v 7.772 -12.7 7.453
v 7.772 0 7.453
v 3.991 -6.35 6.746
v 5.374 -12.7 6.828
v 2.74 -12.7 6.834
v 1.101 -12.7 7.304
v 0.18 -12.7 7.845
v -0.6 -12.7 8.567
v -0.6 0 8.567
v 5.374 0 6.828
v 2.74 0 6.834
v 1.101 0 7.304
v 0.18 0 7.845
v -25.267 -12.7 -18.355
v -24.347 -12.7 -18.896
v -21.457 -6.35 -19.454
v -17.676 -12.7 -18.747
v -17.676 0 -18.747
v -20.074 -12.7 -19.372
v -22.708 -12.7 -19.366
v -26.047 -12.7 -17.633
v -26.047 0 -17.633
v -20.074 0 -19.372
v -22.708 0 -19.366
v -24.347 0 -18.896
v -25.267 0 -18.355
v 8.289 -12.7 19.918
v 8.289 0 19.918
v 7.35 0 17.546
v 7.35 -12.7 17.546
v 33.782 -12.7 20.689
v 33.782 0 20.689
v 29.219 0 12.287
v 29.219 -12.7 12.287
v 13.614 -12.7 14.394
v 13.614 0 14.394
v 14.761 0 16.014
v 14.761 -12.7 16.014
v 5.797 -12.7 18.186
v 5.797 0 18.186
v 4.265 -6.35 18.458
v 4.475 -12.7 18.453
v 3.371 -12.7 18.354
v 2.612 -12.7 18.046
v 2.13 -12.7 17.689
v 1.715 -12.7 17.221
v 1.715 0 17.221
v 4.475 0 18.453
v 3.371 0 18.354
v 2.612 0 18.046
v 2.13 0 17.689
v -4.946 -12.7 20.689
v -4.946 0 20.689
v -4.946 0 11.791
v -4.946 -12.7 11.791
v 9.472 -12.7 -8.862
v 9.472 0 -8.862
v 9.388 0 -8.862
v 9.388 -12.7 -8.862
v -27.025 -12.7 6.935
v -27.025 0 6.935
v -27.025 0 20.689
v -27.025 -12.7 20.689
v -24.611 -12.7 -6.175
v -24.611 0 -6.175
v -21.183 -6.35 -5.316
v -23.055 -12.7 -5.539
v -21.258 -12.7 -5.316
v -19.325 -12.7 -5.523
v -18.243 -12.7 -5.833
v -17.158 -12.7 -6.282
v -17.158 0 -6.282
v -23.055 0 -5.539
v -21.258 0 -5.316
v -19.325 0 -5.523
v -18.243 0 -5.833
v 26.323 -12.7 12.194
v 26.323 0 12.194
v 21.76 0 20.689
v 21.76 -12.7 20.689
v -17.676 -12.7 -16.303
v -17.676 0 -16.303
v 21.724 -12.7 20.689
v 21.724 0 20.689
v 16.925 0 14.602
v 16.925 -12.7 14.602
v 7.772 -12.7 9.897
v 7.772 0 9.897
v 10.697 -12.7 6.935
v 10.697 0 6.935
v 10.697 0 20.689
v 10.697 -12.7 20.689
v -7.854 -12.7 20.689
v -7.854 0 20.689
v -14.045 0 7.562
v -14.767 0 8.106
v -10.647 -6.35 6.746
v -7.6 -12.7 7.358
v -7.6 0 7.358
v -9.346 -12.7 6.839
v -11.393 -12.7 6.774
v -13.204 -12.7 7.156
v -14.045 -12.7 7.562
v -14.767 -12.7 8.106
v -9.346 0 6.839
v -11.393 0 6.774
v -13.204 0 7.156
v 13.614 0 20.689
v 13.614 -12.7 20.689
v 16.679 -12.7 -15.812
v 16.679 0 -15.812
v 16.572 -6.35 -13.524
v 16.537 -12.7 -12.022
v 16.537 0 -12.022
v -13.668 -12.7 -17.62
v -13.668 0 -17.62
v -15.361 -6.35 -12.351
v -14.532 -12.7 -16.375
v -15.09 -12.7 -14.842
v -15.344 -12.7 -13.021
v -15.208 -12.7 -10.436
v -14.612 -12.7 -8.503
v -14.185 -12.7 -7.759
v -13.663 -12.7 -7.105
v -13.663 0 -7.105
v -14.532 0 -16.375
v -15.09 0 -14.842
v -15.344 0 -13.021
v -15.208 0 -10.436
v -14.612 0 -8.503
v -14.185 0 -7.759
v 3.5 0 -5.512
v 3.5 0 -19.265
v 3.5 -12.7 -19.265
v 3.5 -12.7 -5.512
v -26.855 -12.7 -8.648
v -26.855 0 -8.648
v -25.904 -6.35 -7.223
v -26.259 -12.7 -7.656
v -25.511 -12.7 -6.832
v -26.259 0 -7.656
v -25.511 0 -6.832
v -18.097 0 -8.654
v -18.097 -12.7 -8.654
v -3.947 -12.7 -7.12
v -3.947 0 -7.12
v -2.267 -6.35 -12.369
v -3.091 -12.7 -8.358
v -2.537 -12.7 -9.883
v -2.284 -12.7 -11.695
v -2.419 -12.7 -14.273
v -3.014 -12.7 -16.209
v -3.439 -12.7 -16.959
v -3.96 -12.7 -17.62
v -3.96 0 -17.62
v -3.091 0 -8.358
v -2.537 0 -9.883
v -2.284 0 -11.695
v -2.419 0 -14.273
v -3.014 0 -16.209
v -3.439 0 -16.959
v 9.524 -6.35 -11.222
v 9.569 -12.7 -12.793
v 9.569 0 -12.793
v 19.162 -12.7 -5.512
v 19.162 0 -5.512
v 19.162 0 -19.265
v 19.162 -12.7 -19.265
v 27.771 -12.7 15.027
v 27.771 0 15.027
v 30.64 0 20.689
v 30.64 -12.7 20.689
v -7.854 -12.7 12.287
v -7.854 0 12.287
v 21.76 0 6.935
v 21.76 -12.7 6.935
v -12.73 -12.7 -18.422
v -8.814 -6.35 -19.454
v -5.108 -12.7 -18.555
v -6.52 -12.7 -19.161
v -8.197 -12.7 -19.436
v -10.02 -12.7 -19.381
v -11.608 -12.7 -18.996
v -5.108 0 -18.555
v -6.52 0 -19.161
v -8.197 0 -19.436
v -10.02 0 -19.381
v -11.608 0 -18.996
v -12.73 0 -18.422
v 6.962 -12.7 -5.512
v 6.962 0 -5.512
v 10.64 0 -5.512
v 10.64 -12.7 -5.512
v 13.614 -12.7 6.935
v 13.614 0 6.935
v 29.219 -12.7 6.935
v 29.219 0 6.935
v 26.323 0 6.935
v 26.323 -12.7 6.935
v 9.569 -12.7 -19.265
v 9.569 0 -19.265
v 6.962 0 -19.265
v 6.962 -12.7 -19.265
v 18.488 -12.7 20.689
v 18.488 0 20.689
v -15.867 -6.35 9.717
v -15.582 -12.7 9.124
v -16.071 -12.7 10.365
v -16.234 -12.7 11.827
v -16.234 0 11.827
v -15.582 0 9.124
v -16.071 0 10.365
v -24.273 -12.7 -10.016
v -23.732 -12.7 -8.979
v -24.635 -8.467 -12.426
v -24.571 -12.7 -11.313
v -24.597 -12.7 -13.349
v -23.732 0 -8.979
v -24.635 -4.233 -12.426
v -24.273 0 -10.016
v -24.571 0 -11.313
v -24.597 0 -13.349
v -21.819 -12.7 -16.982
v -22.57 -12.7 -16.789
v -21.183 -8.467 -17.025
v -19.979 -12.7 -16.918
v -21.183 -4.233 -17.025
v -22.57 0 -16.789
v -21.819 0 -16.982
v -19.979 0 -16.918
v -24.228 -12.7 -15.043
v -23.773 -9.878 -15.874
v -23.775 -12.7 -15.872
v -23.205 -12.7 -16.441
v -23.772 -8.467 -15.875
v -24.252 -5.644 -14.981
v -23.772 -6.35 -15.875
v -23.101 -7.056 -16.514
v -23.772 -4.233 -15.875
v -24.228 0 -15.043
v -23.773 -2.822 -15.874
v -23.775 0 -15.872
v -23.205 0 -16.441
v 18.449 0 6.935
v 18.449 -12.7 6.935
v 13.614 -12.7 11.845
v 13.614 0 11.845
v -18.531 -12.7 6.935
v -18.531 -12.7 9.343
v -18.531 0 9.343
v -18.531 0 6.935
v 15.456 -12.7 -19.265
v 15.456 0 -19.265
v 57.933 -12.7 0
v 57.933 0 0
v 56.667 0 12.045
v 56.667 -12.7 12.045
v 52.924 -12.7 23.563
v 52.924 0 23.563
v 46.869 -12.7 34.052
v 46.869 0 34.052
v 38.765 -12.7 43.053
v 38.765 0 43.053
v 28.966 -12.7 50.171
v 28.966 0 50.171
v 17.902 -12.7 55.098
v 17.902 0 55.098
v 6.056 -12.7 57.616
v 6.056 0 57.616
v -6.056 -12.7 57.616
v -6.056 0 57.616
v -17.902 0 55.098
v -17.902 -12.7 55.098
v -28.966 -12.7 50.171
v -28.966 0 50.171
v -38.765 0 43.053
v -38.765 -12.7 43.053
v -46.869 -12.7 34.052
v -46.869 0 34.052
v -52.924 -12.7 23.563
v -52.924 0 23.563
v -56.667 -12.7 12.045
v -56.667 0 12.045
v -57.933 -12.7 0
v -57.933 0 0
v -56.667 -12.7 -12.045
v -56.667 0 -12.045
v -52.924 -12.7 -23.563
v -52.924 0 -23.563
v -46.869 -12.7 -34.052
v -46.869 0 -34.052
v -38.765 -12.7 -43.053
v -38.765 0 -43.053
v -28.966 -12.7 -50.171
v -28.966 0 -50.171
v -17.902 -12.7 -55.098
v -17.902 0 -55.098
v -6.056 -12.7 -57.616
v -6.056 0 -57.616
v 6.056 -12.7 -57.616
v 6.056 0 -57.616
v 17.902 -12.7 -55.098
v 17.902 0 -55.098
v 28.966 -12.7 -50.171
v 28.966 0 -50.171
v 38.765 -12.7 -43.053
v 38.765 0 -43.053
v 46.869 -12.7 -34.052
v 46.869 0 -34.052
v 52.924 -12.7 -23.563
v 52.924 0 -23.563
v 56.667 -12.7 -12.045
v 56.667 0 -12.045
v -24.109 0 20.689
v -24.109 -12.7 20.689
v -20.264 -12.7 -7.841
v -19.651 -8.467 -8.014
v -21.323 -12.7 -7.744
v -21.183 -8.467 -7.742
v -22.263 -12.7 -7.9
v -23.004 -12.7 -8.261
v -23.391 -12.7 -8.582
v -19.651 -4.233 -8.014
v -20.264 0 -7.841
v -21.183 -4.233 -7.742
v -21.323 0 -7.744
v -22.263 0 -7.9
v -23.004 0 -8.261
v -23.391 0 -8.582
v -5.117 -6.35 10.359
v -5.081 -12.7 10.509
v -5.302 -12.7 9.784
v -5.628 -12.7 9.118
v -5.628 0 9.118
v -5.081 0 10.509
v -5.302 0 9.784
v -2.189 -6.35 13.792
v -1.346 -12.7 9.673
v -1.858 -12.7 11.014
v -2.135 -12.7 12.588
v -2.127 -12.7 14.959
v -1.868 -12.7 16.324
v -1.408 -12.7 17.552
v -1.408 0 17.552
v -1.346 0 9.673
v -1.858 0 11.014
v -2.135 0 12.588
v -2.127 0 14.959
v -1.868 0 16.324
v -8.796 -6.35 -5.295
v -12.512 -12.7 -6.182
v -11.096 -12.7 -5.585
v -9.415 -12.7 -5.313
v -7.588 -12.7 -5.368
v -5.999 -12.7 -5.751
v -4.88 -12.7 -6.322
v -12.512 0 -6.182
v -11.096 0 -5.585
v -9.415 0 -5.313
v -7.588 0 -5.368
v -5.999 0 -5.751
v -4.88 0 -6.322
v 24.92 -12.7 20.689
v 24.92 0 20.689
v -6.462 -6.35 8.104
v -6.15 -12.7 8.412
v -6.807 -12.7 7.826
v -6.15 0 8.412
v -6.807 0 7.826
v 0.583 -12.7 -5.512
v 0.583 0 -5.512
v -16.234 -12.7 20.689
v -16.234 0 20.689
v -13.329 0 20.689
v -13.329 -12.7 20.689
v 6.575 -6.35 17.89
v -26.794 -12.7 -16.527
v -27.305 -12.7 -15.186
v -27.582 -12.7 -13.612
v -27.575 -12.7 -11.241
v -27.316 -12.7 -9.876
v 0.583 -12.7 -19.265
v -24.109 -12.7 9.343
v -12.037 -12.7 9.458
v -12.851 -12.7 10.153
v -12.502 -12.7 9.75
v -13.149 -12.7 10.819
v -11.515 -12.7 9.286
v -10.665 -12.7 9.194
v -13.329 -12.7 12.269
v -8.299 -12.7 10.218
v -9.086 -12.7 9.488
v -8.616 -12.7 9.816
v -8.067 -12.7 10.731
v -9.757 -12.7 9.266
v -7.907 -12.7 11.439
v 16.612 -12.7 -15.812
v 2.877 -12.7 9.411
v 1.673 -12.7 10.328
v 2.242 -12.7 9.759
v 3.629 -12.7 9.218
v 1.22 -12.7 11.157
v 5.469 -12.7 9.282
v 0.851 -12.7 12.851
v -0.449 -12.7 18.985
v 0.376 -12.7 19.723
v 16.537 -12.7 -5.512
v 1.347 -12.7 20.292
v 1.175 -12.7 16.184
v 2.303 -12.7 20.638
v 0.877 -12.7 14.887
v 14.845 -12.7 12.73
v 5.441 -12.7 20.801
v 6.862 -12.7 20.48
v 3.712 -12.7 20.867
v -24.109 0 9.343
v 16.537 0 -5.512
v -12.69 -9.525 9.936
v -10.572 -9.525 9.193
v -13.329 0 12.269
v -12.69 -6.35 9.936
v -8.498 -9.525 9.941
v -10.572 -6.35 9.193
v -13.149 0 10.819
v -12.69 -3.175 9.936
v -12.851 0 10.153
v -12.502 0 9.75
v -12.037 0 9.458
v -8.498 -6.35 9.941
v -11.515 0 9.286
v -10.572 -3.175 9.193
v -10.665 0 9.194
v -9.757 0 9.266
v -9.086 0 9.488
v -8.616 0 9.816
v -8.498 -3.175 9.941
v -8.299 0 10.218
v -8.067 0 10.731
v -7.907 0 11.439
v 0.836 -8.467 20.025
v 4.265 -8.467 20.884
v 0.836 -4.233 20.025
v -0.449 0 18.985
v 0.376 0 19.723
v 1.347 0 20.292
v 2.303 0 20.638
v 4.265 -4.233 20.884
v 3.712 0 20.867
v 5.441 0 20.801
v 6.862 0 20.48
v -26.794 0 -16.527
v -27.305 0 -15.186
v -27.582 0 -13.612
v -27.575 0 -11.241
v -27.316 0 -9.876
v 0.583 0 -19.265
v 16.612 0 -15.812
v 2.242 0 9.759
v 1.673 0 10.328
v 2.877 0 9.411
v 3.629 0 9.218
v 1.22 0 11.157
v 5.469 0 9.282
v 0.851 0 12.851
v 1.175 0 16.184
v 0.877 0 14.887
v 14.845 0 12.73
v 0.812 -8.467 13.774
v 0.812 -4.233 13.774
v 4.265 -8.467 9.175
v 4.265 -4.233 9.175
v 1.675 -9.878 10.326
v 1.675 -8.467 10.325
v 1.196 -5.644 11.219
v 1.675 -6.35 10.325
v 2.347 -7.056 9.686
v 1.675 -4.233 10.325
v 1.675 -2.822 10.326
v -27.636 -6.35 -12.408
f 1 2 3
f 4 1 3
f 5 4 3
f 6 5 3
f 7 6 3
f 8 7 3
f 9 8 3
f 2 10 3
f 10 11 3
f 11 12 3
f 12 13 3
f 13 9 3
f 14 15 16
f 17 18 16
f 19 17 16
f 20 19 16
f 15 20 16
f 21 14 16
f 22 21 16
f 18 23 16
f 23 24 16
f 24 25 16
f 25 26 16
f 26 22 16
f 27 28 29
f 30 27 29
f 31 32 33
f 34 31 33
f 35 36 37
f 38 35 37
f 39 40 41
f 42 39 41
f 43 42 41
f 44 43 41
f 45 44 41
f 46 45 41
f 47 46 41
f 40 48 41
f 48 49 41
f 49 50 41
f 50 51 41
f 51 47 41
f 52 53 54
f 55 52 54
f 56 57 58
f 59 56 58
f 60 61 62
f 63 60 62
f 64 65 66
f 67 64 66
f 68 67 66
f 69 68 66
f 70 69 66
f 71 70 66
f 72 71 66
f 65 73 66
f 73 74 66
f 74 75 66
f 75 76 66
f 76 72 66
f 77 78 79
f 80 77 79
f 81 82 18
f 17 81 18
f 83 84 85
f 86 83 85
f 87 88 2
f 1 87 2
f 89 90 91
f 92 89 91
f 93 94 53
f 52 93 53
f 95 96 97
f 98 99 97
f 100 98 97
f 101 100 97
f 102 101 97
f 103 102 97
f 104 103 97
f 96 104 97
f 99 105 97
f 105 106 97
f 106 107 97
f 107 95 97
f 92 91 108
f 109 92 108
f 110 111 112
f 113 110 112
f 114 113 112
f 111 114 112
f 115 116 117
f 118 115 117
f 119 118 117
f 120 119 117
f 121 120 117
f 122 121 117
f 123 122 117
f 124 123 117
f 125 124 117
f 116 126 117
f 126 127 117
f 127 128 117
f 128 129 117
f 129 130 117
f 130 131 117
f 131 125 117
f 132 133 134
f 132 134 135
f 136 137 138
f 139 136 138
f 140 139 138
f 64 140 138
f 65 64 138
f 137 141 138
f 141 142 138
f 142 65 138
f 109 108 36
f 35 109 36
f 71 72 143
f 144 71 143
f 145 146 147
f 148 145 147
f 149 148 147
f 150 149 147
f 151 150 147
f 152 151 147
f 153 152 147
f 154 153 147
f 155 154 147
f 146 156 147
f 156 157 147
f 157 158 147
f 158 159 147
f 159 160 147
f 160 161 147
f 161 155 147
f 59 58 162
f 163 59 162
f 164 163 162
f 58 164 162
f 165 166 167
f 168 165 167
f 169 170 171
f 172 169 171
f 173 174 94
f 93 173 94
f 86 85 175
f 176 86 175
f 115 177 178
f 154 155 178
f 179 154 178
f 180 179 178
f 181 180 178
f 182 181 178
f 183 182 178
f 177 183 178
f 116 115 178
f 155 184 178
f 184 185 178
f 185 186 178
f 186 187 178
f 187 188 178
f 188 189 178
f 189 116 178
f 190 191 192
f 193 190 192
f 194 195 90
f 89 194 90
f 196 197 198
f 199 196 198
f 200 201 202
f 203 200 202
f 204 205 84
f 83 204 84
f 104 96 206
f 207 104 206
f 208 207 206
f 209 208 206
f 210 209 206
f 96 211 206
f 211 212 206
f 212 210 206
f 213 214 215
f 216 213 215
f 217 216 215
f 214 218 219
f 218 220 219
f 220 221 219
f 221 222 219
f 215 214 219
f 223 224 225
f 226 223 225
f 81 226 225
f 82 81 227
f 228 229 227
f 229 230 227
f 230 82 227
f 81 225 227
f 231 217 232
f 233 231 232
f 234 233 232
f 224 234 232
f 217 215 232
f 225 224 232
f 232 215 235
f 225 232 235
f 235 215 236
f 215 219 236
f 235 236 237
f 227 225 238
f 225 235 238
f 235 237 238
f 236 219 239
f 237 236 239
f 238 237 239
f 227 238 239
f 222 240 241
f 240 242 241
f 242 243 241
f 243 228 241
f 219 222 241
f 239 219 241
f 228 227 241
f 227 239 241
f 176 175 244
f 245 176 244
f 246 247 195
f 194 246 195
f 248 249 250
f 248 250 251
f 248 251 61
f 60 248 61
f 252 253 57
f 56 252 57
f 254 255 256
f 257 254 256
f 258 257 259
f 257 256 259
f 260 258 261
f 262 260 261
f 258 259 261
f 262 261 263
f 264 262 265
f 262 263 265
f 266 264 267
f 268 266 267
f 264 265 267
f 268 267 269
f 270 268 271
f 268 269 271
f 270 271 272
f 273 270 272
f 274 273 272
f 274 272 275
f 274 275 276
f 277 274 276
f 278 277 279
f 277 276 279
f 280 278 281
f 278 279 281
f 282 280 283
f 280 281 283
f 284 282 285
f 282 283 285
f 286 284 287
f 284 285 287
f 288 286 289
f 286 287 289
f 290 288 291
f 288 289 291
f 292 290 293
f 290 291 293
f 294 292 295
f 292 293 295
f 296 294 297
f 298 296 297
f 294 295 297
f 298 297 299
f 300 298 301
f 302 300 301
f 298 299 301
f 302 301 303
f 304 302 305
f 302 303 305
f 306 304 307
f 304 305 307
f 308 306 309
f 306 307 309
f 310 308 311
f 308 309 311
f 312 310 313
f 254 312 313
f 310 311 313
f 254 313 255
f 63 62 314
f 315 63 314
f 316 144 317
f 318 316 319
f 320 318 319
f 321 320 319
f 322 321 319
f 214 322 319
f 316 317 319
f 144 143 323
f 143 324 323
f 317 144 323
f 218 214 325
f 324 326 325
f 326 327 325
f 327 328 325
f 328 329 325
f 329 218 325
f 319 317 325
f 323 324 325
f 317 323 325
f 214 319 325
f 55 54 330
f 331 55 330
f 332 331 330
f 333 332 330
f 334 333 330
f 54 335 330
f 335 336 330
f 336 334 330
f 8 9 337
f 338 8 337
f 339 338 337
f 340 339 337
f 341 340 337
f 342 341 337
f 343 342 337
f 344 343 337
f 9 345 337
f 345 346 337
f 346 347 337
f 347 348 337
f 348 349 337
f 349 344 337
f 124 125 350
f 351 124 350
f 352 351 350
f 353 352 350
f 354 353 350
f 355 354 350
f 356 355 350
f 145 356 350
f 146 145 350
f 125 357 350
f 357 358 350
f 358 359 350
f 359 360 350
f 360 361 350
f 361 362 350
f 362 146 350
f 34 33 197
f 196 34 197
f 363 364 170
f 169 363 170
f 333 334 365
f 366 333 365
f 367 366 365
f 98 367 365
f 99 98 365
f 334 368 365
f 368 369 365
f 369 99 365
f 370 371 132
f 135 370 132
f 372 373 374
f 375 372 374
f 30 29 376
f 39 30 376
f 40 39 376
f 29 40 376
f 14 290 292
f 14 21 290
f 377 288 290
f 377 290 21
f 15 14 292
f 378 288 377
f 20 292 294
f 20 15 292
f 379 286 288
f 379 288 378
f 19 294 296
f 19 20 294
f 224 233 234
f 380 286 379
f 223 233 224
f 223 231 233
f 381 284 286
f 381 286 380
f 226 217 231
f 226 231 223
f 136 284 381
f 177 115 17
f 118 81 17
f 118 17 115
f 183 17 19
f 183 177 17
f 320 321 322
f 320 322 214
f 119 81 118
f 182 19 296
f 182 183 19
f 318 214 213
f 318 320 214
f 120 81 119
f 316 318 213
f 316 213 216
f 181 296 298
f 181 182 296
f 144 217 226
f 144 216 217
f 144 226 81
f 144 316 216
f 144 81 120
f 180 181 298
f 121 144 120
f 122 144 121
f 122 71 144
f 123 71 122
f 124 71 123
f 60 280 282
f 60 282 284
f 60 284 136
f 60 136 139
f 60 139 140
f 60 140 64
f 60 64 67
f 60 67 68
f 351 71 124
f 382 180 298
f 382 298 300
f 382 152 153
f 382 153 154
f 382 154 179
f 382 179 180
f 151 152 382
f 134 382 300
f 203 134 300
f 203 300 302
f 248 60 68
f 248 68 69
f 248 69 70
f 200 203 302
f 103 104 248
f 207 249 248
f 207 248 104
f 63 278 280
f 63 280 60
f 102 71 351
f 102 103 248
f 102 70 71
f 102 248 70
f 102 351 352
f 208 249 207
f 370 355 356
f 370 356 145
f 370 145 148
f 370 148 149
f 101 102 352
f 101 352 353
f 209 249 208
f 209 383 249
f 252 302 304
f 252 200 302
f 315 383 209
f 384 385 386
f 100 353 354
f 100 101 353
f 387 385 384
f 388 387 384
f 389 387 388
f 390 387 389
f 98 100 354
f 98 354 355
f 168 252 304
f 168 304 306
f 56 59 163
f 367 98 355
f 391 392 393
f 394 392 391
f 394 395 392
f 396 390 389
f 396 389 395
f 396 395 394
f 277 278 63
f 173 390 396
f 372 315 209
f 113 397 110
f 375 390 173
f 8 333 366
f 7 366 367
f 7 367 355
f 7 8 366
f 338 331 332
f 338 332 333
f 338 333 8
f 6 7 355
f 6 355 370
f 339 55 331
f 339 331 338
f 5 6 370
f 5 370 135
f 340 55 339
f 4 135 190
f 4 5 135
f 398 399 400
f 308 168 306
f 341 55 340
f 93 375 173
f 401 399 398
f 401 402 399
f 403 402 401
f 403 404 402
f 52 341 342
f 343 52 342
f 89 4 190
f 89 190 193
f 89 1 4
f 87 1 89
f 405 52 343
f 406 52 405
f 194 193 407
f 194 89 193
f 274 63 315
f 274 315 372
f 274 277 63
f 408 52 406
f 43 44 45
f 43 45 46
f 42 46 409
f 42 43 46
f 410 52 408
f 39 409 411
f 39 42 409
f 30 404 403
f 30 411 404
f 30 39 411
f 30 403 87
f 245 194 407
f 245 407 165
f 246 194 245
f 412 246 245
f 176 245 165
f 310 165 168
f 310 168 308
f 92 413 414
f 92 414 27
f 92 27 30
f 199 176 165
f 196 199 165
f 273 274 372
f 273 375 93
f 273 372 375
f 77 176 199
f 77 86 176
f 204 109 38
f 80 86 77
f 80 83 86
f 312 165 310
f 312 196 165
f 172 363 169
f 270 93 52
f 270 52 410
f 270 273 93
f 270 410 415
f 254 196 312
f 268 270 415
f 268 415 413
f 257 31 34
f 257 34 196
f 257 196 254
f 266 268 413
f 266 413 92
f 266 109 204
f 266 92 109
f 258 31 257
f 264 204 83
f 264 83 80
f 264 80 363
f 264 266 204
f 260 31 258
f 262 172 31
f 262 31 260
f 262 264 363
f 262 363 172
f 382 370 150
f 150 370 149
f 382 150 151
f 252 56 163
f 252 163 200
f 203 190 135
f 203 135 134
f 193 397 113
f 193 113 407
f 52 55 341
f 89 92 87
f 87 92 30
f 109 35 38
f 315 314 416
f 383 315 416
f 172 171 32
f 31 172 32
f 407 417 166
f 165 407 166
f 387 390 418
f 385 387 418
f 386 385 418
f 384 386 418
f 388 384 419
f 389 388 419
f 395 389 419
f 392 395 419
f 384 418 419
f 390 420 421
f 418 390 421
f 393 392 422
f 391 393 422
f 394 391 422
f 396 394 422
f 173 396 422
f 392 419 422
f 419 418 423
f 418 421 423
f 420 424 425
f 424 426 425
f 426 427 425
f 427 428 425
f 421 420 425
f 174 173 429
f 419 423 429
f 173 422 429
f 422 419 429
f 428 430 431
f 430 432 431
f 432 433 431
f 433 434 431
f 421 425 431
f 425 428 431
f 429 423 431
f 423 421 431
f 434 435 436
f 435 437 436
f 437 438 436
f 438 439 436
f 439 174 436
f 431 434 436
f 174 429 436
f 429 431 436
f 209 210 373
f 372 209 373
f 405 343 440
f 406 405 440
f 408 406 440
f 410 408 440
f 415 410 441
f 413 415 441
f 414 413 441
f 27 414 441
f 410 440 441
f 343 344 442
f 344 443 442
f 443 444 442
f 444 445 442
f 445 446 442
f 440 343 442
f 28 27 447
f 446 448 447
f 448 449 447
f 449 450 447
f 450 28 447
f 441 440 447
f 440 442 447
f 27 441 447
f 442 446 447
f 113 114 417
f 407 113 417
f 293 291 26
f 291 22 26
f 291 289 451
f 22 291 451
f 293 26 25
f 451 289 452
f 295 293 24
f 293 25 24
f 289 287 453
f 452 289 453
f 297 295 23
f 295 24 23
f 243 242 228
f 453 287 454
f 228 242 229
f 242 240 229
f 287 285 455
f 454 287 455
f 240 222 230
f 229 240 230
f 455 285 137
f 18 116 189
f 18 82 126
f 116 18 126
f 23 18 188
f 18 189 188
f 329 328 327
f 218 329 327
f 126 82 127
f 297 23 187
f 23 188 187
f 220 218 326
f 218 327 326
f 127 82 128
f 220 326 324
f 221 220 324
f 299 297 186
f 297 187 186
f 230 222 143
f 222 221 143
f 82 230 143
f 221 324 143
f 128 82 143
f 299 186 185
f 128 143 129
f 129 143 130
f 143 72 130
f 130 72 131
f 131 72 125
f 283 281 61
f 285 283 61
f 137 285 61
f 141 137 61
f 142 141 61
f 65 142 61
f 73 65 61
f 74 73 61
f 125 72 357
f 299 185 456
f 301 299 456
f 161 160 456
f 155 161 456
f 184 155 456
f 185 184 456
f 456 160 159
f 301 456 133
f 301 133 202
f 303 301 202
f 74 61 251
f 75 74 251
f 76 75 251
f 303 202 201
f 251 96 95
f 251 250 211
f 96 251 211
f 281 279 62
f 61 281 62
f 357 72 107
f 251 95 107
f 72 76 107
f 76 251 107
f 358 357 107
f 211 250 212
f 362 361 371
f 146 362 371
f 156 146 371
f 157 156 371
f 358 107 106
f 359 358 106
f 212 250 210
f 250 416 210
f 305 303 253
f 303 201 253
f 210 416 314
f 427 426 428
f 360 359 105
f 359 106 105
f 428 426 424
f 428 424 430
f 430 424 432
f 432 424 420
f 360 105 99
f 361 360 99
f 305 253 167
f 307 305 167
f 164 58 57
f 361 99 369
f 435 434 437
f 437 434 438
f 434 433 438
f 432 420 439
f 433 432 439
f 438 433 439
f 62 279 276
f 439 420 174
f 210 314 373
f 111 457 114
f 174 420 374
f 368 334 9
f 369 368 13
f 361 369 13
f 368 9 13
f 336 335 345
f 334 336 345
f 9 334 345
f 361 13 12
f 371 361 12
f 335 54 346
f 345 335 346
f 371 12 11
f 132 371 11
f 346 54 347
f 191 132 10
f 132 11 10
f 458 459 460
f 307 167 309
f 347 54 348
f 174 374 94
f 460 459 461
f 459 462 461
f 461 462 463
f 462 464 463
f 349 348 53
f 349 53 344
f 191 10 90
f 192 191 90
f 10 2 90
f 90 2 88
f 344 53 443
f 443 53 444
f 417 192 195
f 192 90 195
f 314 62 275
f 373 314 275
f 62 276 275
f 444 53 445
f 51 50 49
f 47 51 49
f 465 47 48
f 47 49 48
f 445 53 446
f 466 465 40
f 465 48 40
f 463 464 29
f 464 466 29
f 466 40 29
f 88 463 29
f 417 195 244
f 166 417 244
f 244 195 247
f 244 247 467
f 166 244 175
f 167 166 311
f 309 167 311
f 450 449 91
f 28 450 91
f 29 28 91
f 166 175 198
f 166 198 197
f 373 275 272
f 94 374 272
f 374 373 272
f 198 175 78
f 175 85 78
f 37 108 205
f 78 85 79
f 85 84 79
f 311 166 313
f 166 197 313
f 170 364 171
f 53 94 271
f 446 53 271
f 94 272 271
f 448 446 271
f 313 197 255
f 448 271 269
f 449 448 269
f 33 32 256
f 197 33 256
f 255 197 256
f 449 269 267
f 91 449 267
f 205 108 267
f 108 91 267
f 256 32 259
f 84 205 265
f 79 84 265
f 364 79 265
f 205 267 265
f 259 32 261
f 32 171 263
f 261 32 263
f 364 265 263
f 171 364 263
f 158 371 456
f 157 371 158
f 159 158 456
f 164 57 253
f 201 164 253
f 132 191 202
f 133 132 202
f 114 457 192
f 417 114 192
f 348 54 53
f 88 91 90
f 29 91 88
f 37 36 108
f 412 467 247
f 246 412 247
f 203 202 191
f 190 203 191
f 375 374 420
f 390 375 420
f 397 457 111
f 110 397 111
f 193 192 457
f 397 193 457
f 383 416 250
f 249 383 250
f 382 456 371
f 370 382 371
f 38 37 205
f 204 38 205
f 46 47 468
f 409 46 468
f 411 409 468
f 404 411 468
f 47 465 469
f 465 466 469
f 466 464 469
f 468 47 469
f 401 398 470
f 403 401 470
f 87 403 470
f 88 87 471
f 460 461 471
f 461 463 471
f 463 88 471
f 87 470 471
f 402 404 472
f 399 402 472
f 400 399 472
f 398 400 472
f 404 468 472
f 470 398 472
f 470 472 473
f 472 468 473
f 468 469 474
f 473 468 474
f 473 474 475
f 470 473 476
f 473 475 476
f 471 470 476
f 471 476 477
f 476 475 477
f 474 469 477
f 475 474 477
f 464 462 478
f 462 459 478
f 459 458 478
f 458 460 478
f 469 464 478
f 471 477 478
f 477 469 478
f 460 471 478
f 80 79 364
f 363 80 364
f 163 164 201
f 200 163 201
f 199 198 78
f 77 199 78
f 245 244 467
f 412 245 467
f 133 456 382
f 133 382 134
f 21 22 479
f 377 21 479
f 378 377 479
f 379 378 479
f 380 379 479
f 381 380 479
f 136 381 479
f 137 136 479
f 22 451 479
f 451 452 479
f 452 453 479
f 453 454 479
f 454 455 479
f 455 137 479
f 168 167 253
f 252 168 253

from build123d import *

# Parameters (mm, degrees)
F0_R     = 57.932951026
F0_W     = 2.9168109343
F0_H     = 13.753260226
F1_DEPTH = 12.7


with BuildPart() as f1:
    # F0 (on Front) → F1 (new body)
    with BuildSketch(Plane.XZ):
        Circle(F0_R)
        with BuildLine():
            add(Edge.make_bspline(
                [(-19.6506091277, -8.0144570558), (-20.4302314517, -7.7420407611), (-21.1827626525, -7.7420407611)],
                knots=[0, 0, 0, 1, 1, 1], degree=2))
            add(Edge.make_bspline(
                [(-21.1827626525, -7.7420407611), (-22.8293009199, -7.7420407611), (-23.7323383609, -8.9792020552)],
                knots=[0, 0, 0, 1, 1, 1], degree=2))
            add(Edge.make_bspline(
                [(-23.7323383609, -8.9792020552), (-24.6353758019, -10.2163633494), (-24.6353758019, -12.425794955)],
                knots=[0, 0, 0, 1, 1, 1], degree=2))
            add(Edge.make_bspline(
                [(-24.6353758019, -12.425794955), (-24.6353758019, -17.0252656543), (-21.1827626525, -17.0252656543)],
                knots=[0, 0, 0, 1, 1, 1], degree=2))
            add(Edge.make_bspline(
                [(-21.1827626525, -17.0252656543), (-19.7348926222, -17.0252656543), (-17.6759672568, -16.3028357015)],
                knots=[0, 0, 0, 1, 1, 1], degree=2))
            Line((-17.6759672568, -16.3028357015), (-17.6759672568, -18.7470570418))
            add(Edge.make_bspline(
                [(-17.6759672568, -18.7470570418), (-19.3676573962, -19.4544363705), (-21.4566840096, -19.4544363705)],
                knots=[0, 0, 0, 1, 1, 1], degree=2))
            add(Edge.make_bspline(
                [(-21.4566840096, -19.4544363705), (-24.4577784385, -19.4544363705), (-26.0471243346, -17.6333108646)],
                knots=[0, 0, 0, 1, 1, 1], degree=2))
            add(Edge.make_bspline(
                [(-26.0471243346, -17.6333108646), (-27.6364702307, -15.8121853586), (-27.6364702307, -12.4077342061)],
                knots=[0, 0, 0, 1, 1, 1], degree=2))
            add(Edge.make_bspline(
                [(-27.6364702307, -12.4077342061), (-27.6364702307, -10.2615152214), (-26.8553428443, -8.6480883269)],
                knots=[0, 0, 0, 1, 1, 1], degree=2))
            add(Edge.make_bspline(
                [(-26.8553428443, -8.6480883269), (-26.0742154578, -7.0346614323), (-24.6112948034, -6.175270801)],
                knots=[0, 0, 0, 1, 1, 1], degree=2))
            add(Edge.make_bspline(
                [(-24.6112948034, -6.175270801), (-23.1483741491, -5.3158801697), (-21.1827626525, -5.3158801697)],
                knots=[0, 0, 0, 1, 1, 1], degree=2))
            add(Edge.make_bspline(
                [(-21.1827626525, -5.3158801697), (-19.1810296584, -5.3158801697), (-17.1582257906, -6.2821302315)],
                knots=[0, 0, 0, 1, 1, 1], degree=2))
            Line((-17.1582257906, -6.2821302315), (-18.0973847292, -8.6541085765))
            add(Edge.make_bspline(
                [(-18.0973847292, -8.6541085765), (-18.8709868037, -8.2868733505), (-19.6506091277, -8.0144570558)],
                knots=[0, 0, 0, 1, 1, 1], degree=2))
        make_face(mode=Mode.SUBTRACT)
        with BuildLine():
            add(Edge.make_bspline(
                [(-3.9467880292, -7.1204499892), (-2.267138389, -8.9460906824), (-2.267138389, -12.3686025837)],
                knots=[0, 0, 0, 1, 1, 1], degree=2))
            add(Edge.make_bspline(
                [(-2.267138389, -12.3686025837), (-2.267138389, -15.7850942354), (-3.9603335908, -17.619765303)],
                knots=[0, 0, 0, 1, 1, 1], degree=2))
            add(Edge.make_bspline(
                [(-3.9603335908, -17.619765303), (-5.6535287926, -19.4544363705), (-8.814159836, -19.4544363705)],
                knots=[0, 0, 0, 1, 1, 1], degree=2))
            add(Edge.make_bspline(
                [(-8.814159836, -19.4544363705), (-11.9747908794, -19.4544363705), (-13.6679860812, -17.619765303)],
                knots=[0, 0, 0, 1, 1, 1], degree=2))
            add(Edge.make_bspline(
                [(-13.6679860812, -17.619765303), (-15.3611812831, -15.7850942354), (-15.3611812831, -12.3505418349)],
                knots=[0, 0, 0, 1, 1, 1], degree=2))
            add(Edge.make_bspline(
                [(-15.3611812831, -12.3505418349), (-15.3611812831, -8.9159894344), (-13.663470894, -7.1053993652)],
                knots=[0, 0, 0, 1, 1, 1], degree=2))
            add(Edge.make_bspline(
                [(-13.663470894, -7.1053993652), (-11.965760505, -5.2948092961), (-8.7960990872, -5.2948092961)],
                knots=[0, 0, 0, 1, 1, 1], degree=2))
            add(Edge.make_bspline(
                [(-8.7960990872, -5.2948092961), (-5.6264376694, -5.2948092961), (-3.9467880292, -7.1204499892)],
                knots=[0, 0, 0, 1, 1, 1], degree=2))
        make_face(mode=Mode.SUBTRACT)
        with Locations((2.0418552669, -12.3881683949)):
            Rectangle(F0_W, F0_H, mode=Mode.SUBTRACT)
        with BuildLine():
            Line((19.1619400853, -5.5115382819), (19.1619400853, -19.2647985079))
            Line((19.1619400853, -19.2647985079), (15.4564764525, -19.2647985079))
            Line((15.4564764525, -19.2647985079), (9.4723483437, -8.8618071879))
            Line((9.4723483437, -8.8618071879), (9.3880648492, -8.8618071879))
            add(Edge.make_bspline(
                [(9.3880648492, -8.8618071879), (9.5686723374, -11.6160713829), (9.5686723374, -12.793030181)],
                knots=[0, 0, 0, 1, 1, 1], degree=2))
            Line((9.5686723374, -12.793030181), (9.5686723374, -19.2647985079))
            Line((9.5686723374, -19.2647985079), (6.9619042578, -19.2647985079))
            Line((6.9619042578, -19.2647985079), (6.9619042578, -5.5115382819))
            Line((6.9619042578, -5.5115382819), (10.6402767673, -5.5115382819))
            Line((10.6402767673, -5.5115382819), (16.612364377, -15.8121853586))
            Line((16.612364377, -15.8121853586), (16.6785871226, -15.8121853586))
            add(Edge.make_bspline(
                [(16.6785871226, -15.8121853586), (16.5371112569, -13.1301641589), (16.5371112569, -12.0224382313)],
                knots=[0, 0, 0, 1, 1, 1], degree=2))
            Line((16.5371112569, -12.0224382313), (16.5371112569, -5.5115382819))
            Line((16.5371112569, -5.5115382819), (19.1619400853, -5.5115382819))
        make_face(mode=Mode.SUBTRACT)
        Polygon((-18.5308427009, 6.9353277795), (-27.0254148956, 6.9353277795), (-27.0254148956, 20.6885880055), (-24.1086039613, 20.6885880055), (-24.1086039613, 9.3434276221), (-18.5308427009, 9.3434276221), align=None, mode=Mode.SUBTRACT)
        with BuildLine():
            Line((-7.8539300238, 20.6885880055), (-4.9461494639, 20.6885880055))
            Line((-4.9461494639, 20.6885880055), (-4.9461494639, 11.7906590871))
            add(Edge.make_bspline(
                [(-4.9461494639, 11.7906590871), (-4.9461494639, 10.2645258119), (-5.6279427318, 9.1176682619)],
                knots=[0, 0, 0, 1, 1, 1], degree=2))
            add(Edge.make_bspline(
                [(-5.6279427318, 9.1176682619), (-6.3097359997, 7.9708107118), (-7.5995744779, 7.3582503144)],
                knots=[0, 0, 0, 1, 1, 1], degree=2))
            add(Edge.make_bspline(
                [(-7.5995744779, 7.3582503144), (-8.8894129561, 6.7456899169), (-10.6473258412, 6.7456899169)],
                knots=[0, 0, 0, 1, 1, 1], degree=2))
            add(Edge.make_bspline(
                [(-10.6473258412, 6.7456899169), (-13.2992457928, 6.7456899169), (-14.7666816344, 8.106266328)],
                knots=[0, 0, 0, 1, 1, 1], degree=2))
            add(Edge.make_bspline(
                [(-14.7666816344, 8.106266328), (-16.234117476, 9.466842739), (-16.234117476, 11.8267805848)],
                knots=[0, 0, 0, 1, 1, 1], degree=2))
            Line((-16.234117476, 11.8267805848), (-16.234117476, 20.6885880055))
            Line((-16.234117476, 20.6885880055), (-13.3293470409, 20.6885880055))
            Line((-13.3293470409, 20.6885880055), (-13.3293470409, 12.2692689308))
            add(Edge.make_bspline(
                [(-13.3293470409, 12.2692689308), (-13.3293470409, 10.6799230347), (-12.6896955202, 9.9364222083)],
                knots=[0, 0, 0, 1, 1, 1], degree=2))
            add(Edge.make_bspline(
                [(-12.6896955202, 9.9364222083), (-12.0500439995, 9.1929213819), (-10.5720727211, 9.1929213819)],
                knots=[0, 0, 0, 1, 1, 1], degree=2))
            add(Edge.make_bspline(
                [(-10.5720727211, 9.1929213819), (-9.1422634396, 9.1929213819), (-8.4980967317, 9.9409373955)],
                knots=[0, 0, 0, 1, 1, 1], degree=2))
            add(Edge.make_bspline(
                [(-8.4980967317, 9.9409373955), (-7.8539300238, 10.6889534091), (-7.8539300238, 12.2873296797)],
                knots=[0, 0, 0, 1, 1, 1], degree=2))
            Line((-7.8539300238, 12.2873296797), (-7.8539300238, 20.6885880055))
        make_face(mode=Mode.SUBTRACT)
        with BuildLine():
            add(Edge.make_bspline(
                [(5.7969859589, 18.1856692316), (5.0173636349, 18.4580855263), (4.2648324341, 18.4580855263)],
                knots=[0, 0, 0, 1, 1, 1], degree=2))
            add(Edge.make_bspline(
                [(4.2648324341, 18.4580855263), (2.6182941667, 18.4580855263), (1.7152567257, 17.2209242322)],
                knots=[0, 0, 0, 1, 1, 1], degree=2))
            add(Edge.make_bspline(
                [(1.7152567257, 17.2209242322), (0.8122192848, 15.983762938), (0.8122192848, 13.7743313325)],
                knots=[0, 0, 0, 1, 1, 1], degree=2))
            add(Edge.make_bspline(
                [(0.8122192848, 13.7743313325), (0.8122192848, 9.1748606331), (4.2648324341, 9.1748606331)],
                knots=[0, 0, 0, 1, 1, 1], degree=2))
            add(Edge.make_bspline(
                [(4.2648324341, 9.1748606331), (5.7127024644, 9.1748606331), (7.7716278298, 9.8972905859)],
                knots=[0, 0, 0, 1, 1, 1], degree=2))
            Line((7.7716278298, 9.8972905859), (7.7716278298, 7.4530692457))
            add(Edge.make_bspline(
                [(7.7716278298, 7.4530692457), (6.0799376904, 6.7456899169), (3.990911077, 6.7456899169)],
                knots=[0, 0, 0, 1, 1, 1], degree=2))
            add(Edge.make_bspline(
                [(3.990911077, 6.7456899169), (0.9898166481, 6.7456899169), (-0.599529248, 8.5668154229)],
                knots=[0, 0, 0, 1, 1, 1], degree=2))
            add(Edge.make_bspline(
                [(-0.599529248, 8.5668154229), (-2.1888751441, 10.3879409288), (-2.1888751441, 13.7923920813)],
                knots=[0, 0, 0, 1, 1, 1], degree=2))
            add(Edge.make_bspline(
                [(-2.1888751441, 13.7923920813), (-2.1888751441, 15.938611066), (-1.4077477576, 17.5520379605)],
                knots=[0, 0, 0, 1, 1, 1], degree=2))
            add(Edge.make_bspline(
                [(-1.4077477576, 17.5520379605), (-0.6266203712, 19.1654648551), (0.8363002832, 20.0248554864)],
                knots=[0, 0, 0, 1, 1, 1], degree=2))
            add(Edge.make_bspline(
                [(0.8363002832, 20.0248554864), (2.2992209376, 20.8842461177), (4.2648324341, 20.8842461177)],
                knots=[0, 0, 0, 1, 1, 1], degree=2))
            add(Edge.make_bspline(
                [(4.2648324341, 20.8842461177), (6.2665654282, 20.8842461177), (8.289369296, 19.9179960559)],
                knots=[0, 0, 0, 1, 1, 1], degree=2))
            Line((8.289369296, 19.9179960559), (7.3502103574, 17.5460177109))
            add(Edge.make_bspline(
                [(7.3502103574, 17.5460177109), (6.576608283, 17.9132529369), (5.7969859589, 18.1856692316)],
                knots=[0, 0, 0, 1, 1, 1], degree=2))
        make_face(mode=Mode.SUBTRACT)
        Polygon((16.9254173565, 14.6021156534), (21.7596777905, 6.9353277795), (18.448540507, 6.9353277795), (14.8454211175, 12.7298180257), (13.6142800729, 11.8448413336), (13.6142800729, 6.9353277795), (10.6974691386, 6.9353277795), (10.6974691386, 20.6885880055), (13.6142800729, 20.6885880055), (13.6142800729, 14.3944170419), (14.761137623, 16.0138641861), (18.4876721294, 20.6885880055), (21.7235562929, 20.6885880055), align=None, mode=Mode.SUBTRACT)
        Polygon((24.9203088339, 20.6885880055), (27.7708970226, 15.0265432506), (30.6395459601, 20.6885880055), (33.7821162547, 20.6885880055), (29.218767053, 12.2873296797), (29.218767053, 6.9353277795), (26.3230269922, 6.9353277795), (26.3230269922, 12.1940158108), (21.7596777905, 20.6885880055), align=None, mode=Mode.SUBTRACT)
    extrude(amount=F1_DEPTH)


solid = f1.part
